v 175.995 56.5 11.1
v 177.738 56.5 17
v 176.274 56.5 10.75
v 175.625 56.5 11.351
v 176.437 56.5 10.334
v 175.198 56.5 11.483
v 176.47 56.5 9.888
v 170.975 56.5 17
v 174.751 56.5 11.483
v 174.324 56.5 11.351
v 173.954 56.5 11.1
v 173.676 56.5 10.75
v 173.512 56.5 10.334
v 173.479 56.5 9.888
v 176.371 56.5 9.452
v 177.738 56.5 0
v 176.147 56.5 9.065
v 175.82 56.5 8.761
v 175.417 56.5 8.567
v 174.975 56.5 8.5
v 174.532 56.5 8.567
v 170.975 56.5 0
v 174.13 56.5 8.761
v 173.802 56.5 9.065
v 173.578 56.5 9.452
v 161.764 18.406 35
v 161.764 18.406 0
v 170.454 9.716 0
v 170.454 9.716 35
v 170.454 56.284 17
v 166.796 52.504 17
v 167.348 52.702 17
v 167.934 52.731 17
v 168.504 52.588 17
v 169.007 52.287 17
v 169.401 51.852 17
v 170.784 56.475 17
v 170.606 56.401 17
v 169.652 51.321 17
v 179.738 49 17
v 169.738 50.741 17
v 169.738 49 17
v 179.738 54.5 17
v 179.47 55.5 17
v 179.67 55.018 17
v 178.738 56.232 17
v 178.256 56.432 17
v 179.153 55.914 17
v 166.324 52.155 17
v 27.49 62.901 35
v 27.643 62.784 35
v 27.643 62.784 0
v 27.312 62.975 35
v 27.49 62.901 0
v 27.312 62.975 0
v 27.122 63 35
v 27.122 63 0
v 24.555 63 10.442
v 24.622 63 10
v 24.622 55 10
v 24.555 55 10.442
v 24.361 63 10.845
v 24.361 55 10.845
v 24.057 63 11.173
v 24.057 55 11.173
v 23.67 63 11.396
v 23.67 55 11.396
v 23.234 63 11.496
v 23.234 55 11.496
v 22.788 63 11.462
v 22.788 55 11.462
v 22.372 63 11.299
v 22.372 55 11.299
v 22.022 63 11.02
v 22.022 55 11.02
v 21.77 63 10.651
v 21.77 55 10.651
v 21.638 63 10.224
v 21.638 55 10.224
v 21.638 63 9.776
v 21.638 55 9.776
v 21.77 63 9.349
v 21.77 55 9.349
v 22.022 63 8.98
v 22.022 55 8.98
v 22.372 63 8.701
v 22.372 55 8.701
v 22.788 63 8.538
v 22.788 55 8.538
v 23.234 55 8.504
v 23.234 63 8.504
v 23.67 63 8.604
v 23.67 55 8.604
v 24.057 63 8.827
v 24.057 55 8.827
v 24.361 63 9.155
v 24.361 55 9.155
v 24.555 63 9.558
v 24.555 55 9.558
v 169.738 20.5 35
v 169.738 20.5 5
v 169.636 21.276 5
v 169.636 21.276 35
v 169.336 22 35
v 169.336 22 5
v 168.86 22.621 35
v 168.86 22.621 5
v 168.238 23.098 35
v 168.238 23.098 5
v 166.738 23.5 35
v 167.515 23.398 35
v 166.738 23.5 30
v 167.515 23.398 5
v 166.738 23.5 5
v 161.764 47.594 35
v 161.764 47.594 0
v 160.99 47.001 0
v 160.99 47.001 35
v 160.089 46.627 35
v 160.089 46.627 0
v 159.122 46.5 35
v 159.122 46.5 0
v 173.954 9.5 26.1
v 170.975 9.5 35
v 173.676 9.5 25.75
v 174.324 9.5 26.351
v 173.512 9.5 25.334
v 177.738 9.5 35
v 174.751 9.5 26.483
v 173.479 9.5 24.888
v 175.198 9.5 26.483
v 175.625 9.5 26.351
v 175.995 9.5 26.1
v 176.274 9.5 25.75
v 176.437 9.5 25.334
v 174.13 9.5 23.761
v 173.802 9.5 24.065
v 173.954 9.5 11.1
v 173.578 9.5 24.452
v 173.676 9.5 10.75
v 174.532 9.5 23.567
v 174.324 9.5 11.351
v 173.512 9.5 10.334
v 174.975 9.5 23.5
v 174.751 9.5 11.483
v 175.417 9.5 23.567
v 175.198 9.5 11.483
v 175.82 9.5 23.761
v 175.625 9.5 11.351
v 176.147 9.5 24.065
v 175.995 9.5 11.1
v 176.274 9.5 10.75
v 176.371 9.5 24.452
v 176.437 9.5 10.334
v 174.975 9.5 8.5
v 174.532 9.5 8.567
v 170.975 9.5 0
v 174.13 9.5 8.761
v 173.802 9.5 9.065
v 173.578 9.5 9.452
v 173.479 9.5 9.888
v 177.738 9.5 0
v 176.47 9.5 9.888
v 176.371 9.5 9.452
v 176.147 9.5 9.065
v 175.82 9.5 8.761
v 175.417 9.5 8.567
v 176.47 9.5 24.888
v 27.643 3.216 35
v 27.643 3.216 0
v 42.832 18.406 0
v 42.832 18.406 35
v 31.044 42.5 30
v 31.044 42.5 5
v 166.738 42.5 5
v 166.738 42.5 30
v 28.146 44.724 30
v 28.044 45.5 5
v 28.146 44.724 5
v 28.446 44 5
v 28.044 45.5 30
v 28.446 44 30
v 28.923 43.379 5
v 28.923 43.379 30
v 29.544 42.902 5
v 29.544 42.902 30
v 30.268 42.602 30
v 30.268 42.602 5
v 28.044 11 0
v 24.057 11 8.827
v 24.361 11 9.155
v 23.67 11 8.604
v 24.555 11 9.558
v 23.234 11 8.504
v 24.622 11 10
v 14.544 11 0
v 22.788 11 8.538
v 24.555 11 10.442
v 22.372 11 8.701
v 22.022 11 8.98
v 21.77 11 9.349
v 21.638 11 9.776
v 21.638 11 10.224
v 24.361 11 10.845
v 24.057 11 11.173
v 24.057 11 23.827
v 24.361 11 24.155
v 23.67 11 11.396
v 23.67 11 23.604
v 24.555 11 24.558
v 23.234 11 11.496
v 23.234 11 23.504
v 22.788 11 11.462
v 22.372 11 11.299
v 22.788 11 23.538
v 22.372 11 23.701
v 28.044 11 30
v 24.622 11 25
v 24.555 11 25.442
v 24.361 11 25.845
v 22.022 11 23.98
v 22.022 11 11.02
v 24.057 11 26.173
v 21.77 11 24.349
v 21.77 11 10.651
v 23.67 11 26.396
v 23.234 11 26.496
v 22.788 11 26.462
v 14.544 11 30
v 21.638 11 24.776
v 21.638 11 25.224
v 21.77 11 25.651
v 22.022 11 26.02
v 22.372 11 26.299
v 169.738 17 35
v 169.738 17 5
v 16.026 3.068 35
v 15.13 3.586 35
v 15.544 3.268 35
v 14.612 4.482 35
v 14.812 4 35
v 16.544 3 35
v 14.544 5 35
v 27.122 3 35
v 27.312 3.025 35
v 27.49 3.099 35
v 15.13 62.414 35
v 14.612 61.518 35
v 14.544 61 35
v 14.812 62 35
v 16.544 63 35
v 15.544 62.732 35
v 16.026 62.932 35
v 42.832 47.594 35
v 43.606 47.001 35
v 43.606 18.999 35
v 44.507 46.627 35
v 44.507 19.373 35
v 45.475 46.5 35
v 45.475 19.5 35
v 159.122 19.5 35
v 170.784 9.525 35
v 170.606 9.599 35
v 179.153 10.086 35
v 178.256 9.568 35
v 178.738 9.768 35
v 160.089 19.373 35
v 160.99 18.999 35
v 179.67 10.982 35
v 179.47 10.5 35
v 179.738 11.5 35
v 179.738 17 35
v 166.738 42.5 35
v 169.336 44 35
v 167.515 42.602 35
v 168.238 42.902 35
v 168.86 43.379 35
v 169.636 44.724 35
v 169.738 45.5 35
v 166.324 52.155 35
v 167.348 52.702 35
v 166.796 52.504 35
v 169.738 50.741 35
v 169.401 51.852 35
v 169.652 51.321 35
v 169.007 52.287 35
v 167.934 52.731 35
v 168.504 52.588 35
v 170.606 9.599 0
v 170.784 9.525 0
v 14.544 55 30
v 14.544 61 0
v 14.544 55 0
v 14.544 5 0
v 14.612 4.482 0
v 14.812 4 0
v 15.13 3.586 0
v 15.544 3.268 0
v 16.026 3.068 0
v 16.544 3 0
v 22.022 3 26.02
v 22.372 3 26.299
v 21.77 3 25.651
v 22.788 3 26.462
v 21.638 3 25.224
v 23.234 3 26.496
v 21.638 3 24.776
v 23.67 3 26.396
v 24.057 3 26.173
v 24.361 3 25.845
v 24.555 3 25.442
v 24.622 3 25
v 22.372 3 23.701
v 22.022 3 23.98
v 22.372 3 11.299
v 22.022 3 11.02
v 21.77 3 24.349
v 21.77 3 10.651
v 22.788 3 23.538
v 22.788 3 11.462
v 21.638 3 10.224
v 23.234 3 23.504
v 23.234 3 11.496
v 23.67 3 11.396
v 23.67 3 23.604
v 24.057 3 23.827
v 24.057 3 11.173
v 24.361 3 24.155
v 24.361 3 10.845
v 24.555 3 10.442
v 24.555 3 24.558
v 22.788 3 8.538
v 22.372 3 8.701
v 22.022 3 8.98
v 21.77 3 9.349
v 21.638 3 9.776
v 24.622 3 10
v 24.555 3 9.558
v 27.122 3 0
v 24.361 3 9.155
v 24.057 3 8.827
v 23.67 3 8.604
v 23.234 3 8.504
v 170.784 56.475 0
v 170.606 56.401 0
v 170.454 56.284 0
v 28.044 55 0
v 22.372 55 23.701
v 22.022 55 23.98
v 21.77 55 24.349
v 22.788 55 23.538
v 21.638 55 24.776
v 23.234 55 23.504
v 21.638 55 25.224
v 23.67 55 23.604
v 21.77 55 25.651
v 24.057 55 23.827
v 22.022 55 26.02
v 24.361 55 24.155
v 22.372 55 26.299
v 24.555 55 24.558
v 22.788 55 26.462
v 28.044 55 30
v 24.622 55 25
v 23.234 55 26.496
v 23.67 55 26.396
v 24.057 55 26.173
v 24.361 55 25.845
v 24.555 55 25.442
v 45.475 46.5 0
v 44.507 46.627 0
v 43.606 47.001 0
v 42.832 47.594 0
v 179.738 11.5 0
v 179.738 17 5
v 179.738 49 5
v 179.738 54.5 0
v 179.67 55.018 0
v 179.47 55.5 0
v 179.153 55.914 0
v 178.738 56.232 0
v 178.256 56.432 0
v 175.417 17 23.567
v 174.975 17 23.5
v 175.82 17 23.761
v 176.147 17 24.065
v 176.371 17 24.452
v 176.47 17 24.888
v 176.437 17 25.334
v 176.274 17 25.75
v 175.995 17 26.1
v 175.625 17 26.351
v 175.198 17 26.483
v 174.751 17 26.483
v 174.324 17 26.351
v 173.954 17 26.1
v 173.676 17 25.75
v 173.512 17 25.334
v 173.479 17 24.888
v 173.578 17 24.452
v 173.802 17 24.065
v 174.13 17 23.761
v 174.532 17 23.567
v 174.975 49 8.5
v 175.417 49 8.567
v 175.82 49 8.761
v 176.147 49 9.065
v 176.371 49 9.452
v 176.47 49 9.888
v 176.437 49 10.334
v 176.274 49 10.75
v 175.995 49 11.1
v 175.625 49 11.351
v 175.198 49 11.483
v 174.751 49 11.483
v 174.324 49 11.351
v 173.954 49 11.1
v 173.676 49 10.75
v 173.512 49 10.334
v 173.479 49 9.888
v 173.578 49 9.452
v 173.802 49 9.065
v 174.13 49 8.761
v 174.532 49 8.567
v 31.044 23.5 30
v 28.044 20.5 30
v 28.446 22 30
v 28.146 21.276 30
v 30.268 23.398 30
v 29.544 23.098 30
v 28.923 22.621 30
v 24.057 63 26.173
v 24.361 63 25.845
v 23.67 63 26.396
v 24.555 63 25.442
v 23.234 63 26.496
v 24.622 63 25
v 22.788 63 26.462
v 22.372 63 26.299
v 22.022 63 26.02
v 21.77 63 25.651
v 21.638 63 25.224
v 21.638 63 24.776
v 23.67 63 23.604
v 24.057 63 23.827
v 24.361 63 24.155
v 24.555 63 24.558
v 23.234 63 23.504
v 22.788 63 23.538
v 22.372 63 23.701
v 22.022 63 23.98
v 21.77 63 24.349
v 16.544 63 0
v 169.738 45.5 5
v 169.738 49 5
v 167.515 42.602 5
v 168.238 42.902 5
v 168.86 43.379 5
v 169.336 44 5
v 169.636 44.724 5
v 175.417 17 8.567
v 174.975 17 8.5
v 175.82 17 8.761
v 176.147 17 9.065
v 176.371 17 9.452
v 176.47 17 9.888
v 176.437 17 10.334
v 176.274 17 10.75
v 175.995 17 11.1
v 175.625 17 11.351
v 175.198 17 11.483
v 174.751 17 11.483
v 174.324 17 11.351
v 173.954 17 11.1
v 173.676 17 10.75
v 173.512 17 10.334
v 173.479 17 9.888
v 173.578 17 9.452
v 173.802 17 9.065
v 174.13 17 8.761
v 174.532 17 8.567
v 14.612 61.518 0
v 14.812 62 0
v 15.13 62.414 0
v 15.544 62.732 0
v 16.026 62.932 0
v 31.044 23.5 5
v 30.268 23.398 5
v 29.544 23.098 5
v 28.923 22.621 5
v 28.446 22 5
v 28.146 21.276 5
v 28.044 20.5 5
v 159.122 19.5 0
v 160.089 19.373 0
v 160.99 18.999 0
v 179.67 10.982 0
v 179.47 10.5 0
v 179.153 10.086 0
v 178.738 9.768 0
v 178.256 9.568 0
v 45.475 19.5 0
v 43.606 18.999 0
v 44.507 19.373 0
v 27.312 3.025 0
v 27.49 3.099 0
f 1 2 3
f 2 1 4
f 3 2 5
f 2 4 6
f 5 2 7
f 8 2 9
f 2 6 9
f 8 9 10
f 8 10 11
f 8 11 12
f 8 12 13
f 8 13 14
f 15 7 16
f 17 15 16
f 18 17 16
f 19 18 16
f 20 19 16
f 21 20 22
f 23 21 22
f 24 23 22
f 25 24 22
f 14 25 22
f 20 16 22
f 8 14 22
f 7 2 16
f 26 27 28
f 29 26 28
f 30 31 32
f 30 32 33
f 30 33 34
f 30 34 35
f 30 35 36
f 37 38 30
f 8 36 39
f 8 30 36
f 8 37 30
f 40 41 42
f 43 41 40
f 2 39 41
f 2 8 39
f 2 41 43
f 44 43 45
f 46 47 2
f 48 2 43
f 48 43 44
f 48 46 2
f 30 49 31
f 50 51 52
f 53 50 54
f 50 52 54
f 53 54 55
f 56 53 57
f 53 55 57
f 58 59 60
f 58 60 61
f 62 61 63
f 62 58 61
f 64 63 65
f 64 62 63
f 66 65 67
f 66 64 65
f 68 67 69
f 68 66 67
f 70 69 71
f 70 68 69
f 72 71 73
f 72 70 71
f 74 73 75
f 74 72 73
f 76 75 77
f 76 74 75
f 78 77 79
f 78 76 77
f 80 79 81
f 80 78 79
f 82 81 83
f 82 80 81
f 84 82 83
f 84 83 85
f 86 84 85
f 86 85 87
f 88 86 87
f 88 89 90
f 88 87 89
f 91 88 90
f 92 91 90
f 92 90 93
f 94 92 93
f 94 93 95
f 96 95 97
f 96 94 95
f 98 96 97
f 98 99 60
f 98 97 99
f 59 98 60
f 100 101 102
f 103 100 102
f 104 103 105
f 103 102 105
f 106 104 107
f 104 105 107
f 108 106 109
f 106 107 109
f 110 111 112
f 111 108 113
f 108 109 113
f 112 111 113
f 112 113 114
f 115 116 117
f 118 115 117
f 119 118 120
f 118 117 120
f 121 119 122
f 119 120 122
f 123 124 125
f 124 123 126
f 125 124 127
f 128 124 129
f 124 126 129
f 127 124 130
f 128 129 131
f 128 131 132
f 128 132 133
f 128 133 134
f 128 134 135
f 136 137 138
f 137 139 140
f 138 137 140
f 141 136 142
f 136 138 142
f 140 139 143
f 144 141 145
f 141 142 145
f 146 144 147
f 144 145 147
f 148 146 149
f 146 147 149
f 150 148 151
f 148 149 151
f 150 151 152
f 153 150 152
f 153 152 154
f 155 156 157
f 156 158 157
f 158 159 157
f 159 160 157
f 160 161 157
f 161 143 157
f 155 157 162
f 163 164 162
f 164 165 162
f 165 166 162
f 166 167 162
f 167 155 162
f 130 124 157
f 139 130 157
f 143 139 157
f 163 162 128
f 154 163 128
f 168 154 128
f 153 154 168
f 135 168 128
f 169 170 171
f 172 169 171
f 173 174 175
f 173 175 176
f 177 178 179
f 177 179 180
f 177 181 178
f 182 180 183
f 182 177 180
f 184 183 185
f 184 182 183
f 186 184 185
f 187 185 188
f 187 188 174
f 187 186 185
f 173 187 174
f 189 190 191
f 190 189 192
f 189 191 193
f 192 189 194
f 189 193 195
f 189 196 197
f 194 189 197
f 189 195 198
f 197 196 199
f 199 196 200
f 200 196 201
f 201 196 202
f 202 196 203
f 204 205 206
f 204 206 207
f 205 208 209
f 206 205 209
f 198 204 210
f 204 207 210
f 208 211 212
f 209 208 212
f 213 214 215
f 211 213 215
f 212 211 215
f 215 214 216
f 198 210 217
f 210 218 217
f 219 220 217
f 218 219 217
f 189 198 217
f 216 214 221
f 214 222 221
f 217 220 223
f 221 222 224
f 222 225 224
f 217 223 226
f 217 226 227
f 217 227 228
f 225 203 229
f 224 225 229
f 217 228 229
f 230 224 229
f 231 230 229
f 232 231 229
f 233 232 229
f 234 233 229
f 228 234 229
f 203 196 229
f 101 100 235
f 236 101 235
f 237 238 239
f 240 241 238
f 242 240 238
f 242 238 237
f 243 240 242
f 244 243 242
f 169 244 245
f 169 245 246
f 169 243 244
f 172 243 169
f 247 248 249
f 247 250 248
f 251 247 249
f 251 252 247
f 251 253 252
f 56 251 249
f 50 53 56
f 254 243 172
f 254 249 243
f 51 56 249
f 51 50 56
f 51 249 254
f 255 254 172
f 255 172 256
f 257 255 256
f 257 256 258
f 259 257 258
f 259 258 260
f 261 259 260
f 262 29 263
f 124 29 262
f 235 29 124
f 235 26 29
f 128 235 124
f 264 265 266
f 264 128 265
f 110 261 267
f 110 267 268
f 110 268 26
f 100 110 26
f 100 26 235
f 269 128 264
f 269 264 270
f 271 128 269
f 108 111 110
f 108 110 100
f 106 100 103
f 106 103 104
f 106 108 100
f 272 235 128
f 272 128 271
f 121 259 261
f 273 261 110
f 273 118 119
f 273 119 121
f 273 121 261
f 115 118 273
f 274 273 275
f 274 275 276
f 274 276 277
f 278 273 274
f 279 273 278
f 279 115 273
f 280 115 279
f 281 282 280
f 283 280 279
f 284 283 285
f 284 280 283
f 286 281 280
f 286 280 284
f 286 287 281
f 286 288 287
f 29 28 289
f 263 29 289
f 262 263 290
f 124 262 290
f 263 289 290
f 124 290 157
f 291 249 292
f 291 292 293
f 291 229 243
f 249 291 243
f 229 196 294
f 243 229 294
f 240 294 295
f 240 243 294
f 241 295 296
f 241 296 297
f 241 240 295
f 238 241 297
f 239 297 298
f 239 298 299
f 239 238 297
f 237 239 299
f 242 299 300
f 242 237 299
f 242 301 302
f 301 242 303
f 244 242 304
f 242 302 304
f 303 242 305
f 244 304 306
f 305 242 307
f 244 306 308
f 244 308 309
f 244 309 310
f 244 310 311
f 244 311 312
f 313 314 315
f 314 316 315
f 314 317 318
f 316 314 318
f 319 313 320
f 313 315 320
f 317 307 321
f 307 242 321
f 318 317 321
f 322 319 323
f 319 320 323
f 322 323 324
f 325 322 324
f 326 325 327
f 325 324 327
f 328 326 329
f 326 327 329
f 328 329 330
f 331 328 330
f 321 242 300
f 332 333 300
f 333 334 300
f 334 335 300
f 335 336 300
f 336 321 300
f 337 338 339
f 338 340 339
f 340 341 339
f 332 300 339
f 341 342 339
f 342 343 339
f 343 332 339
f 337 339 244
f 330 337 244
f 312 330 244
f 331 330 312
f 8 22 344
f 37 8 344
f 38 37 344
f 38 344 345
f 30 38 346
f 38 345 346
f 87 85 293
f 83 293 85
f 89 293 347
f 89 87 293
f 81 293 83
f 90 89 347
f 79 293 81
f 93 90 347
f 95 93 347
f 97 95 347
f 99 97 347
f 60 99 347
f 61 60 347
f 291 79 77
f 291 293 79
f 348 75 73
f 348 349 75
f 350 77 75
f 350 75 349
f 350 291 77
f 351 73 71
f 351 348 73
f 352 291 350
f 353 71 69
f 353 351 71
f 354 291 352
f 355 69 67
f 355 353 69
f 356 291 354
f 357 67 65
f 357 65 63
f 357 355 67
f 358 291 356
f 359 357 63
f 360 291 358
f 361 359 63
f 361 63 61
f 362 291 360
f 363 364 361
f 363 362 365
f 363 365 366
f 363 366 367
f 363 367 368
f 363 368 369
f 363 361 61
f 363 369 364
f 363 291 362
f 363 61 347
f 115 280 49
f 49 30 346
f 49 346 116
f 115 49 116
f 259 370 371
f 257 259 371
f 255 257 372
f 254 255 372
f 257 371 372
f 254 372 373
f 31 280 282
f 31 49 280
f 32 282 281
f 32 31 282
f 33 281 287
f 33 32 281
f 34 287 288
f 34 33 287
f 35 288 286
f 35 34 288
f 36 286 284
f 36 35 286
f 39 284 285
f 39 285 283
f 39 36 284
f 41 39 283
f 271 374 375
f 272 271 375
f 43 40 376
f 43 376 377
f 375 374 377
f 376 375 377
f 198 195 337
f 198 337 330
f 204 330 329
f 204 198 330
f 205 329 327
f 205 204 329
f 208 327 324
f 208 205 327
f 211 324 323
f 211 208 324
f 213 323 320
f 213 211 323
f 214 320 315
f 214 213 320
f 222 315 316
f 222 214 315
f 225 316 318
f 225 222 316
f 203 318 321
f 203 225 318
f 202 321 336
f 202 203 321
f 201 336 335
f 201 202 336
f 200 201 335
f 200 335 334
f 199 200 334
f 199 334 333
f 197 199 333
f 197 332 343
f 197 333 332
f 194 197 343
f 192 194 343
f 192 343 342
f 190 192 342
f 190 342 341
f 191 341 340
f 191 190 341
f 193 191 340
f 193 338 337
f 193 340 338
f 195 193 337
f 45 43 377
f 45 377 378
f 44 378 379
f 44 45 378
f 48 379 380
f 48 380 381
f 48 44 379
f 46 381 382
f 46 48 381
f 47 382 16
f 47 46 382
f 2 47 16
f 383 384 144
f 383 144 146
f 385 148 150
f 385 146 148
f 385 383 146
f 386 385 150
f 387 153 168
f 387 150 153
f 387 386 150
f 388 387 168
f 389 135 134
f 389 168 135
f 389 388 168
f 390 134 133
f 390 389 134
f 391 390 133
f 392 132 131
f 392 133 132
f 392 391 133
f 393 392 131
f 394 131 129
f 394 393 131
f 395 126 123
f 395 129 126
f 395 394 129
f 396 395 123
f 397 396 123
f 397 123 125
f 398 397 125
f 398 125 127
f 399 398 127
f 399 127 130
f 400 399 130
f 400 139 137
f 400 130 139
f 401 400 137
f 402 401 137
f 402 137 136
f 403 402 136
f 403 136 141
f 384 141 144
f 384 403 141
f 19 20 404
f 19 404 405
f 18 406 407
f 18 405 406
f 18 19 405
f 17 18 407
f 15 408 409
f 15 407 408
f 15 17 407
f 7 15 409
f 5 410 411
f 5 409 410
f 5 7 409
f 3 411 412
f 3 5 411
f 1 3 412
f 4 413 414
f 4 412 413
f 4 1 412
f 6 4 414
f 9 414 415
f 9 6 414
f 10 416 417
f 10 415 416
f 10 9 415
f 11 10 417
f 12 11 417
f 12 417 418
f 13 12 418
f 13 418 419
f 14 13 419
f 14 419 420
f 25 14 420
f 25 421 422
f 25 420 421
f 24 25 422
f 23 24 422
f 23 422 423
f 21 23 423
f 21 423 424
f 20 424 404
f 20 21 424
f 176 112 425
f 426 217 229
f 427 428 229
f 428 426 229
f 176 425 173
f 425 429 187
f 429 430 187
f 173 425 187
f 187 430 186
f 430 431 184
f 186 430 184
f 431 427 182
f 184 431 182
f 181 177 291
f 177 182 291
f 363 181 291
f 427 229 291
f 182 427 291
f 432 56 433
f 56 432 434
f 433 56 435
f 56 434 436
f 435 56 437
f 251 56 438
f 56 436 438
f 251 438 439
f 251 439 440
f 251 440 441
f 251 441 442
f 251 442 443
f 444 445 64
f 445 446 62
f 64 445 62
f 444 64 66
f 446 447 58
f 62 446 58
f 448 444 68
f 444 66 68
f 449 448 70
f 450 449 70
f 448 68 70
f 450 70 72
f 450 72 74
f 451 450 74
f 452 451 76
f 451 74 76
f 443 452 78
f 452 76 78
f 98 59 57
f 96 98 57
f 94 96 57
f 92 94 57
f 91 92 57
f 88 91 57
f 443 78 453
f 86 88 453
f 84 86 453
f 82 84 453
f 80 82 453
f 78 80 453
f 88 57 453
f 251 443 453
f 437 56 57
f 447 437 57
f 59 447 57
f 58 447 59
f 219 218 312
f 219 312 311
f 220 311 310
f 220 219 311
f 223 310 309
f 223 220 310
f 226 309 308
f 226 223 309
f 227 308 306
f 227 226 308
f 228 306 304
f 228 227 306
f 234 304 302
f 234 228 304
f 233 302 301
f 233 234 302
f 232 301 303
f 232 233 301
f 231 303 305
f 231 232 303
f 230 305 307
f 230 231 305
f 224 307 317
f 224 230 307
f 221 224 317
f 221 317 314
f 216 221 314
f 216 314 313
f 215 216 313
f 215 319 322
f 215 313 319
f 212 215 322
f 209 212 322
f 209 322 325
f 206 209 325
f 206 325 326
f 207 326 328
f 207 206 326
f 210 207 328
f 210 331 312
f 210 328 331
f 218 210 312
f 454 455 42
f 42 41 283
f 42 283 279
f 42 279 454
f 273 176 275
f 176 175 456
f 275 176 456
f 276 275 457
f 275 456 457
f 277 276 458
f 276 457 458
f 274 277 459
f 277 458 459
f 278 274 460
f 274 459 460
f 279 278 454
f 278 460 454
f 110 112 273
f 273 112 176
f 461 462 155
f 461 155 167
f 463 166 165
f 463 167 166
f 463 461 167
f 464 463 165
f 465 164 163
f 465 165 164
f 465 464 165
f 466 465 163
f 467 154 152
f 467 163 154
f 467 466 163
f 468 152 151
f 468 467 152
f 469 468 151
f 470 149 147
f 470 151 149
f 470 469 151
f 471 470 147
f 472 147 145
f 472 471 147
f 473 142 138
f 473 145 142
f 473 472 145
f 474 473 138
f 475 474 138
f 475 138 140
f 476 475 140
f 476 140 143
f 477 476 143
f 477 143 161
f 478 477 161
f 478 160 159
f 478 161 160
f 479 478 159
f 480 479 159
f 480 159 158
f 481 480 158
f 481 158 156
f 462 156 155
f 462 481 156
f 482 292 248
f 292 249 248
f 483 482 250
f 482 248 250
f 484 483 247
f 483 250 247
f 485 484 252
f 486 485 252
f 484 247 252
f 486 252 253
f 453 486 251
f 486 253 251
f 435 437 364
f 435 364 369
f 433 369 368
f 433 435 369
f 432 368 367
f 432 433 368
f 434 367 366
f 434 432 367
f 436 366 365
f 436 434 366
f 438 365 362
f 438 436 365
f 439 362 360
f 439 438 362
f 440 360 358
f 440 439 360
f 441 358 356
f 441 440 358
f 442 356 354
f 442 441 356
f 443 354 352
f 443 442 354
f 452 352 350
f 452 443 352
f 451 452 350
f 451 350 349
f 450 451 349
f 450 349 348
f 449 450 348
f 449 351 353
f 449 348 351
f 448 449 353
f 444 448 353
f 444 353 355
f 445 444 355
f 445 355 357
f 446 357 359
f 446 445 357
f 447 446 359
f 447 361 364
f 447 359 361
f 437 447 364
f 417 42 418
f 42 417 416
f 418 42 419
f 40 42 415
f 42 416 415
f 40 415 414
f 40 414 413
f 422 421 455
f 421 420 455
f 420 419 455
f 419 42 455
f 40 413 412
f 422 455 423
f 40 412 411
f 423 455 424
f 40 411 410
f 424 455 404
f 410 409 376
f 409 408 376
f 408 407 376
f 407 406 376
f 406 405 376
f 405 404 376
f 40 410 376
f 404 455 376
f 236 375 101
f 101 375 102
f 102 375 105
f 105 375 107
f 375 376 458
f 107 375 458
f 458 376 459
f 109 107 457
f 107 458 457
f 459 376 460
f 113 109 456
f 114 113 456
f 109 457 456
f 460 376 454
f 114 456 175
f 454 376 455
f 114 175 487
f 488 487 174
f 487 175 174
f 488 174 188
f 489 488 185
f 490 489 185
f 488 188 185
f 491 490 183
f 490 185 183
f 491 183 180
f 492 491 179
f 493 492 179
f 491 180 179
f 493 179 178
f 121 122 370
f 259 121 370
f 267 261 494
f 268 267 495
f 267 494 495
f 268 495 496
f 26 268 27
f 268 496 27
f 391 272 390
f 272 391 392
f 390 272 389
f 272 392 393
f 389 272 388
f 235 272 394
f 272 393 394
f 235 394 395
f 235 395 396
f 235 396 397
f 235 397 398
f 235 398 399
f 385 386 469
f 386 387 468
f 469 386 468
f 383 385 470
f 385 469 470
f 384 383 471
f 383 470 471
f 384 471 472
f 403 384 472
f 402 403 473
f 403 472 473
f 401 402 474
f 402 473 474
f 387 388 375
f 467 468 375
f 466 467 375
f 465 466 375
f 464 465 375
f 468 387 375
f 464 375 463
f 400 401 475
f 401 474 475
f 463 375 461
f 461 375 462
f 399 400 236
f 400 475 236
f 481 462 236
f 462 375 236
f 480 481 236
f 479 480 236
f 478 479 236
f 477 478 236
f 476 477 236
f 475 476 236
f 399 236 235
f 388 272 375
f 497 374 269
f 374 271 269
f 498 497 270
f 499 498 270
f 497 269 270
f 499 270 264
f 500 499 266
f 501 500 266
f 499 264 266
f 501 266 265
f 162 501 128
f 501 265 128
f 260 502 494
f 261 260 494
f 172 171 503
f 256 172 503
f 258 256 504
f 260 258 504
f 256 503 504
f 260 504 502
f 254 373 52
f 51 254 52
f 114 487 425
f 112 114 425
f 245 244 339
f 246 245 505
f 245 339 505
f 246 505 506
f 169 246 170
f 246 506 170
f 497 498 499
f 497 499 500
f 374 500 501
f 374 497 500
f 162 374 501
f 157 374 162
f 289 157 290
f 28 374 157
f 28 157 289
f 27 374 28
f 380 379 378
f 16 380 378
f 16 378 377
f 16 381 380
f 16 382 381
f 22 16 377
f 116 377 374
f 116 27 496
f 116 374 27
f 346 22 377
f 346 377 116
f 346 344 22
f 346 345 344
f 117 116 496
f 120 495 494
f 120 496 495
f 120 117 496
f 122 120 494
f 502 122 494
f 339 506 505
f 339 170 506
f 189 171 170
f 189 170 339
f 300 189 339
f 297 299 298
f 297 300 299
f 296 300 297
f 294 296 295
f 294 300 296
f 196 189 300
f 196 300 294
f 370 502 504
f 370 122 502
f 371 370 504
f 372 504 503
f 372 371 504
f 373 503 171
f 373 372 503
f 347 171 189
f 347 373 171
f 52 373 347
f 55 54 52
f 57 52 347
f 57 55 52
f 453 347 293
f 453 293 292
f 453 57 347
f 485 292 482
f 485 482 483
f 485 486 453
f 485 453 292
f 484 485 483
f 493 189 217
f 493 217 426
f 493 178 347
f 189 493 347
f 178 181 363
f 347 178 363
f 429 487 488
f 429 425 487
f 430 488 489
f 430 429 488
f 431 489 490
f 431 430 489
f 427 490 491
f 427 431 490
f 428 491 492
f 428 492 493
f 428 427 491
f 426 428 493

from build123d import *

# Parameters (mm, degrees)
EXTRUDE_1_DEPTH          = 35
SKETCH_3_W               = 25
SKETCH_3_H               = 19
CUT_EXTRUDE_1_DEPTH      = 181.230887126
SKETCH_4_W               = 25
SKETCH_4_H               = 12.5
CUT_EXTRUDE_2_DEPTH      = 13.5
SKETCH_5_W               = 25
SKETCH_5_H               = 32
CUT_EXTRUDE_3_DEPTH      = 10
FILLET_1_R               = 3
FILLET_2_R               = 2
CUT_EXTRUDE_4_DEPTH      = 191.354670013
CUT_EXTRUDE_4_DEPTH_BACK = 191.354670013
SKETCH_6_R               = 1.5
CUT_EXTRUDE_5_DEPTH      = 189.803867534
CUT_EXTRUDE_5_DEPTH_BACK = 189.803867534
SKETCH_7_R               = 1.5
SKETCH_8_W               = 13.5
SKETCH_8_H               = 44
SKETCH_8_W_2             = 10
SKETCH_8_H_2             = 32
CUT_EXTRUDE_6_DEPTH      = 193.807936548
CUT_EXTRUDE_7_DEPTH      = 10
CUT_EXTRUDE_8_DEPTH      = 18
FILLET_3_R               = 2
SKETCH_11_W              = 10
SKETCH_11_H              = 32
EXTRUDE_2_DEPTH          = 5
CUT_EXTRUDE_10_DEPTH     = 5


with BuildPart() as part:
    # 草图1 → 凸台-拉伸1 (new body)
    with BuildSketch(Plane.XY):
        with BuildLine():
            Line((42.832374142, 47.594424801), (27.642544089, 62.784254855))
            ThreePointArc((27.642544089, 62.784254855), (27.40357385, 62.943929664), (27.121689234, 63))
            Line((27.121689234, 63), (14.544073956, 63))
            Line((14.544073956, 63), (14.544073956, 3))
            Line((14.544073956, 3), (27.121689234, 3))
            ThreePointArc((27.121689234, 3), (27.40357385, 3.056070336), (27.642544089, 3.215745145))
            Line((27.642544089, 3.215745145), (42.832374142, 18.405575199))
            ThreePointArc((42.832374142, 18.405575199), (44.044614428, 19.215568261), (45.474549341, 19.5))
            Line((45.474549341, 19.5), (159.121689234, 19.5))
            ThreePointArc((159.121689234, 19.5), (160.551624147, 19.215568261), (161.763864432, 18.405575199))
            Line((161.763864432, 18.405575199), (170.453694486, 9.715745145))
            ThreePointArc((170.453694486, 9.715745145), (170.692664725, 9.556070336), (170.974549341, 9.5))
            Line((170.974549341, 9.5), (179.738422147, 9.5))
            Line((179.738422147, 9.5), (179.738422147, 56.5))
            Line((179.738422147, 56.5), (170.974549341, 56.5))
            ThreePointArc((170.974549341, 56.5), (170.692664725, 56.443929664), (170.453694486, 56.284254855))
            Line((170.453694486, 56.284254855), (161.763864432, 47.594424801))
            ThreePointArc((161.763864432, 47.594424801), (160.551624147, 46.784431739), (159.121689234, 46.5))
            Line((159.121689234, 46.5), (45.474549341, 46.5))
            ThreePointArc((45.474549341, 46.5), (44.044614428, 46.784431739), (42.832374142, 47.594424801))
        make_face()
    extrude(amount=EXTRUDE_1_DEPTH)

    # 草图3 → 切除-拉伸1 (cut, through all)
    with BuildSketch(Plane.ZY.offset(-14.544073956)):
        with Locations((17.5, 33)):
            Rectangle(SKETCH_3_W, SKETCH_3_H)
    extrude(amount=-CUT_EXTRUDE_1_DEPTH, mode=Mode.SUBTRACT)

    # 草图4 → 切除-拉伸2 (cut)
    with BuildSketch(Plane.ZY.offset(-14.544073956)):
        with Locations((17.5, 48.75)):
            Rectangle(SKETCH_4_W, SKETCH_4_H)
        with Locations((17.5, 17.25)):
            Rectangle(SKETCH_4_W, SKETCH_4_H)
    extrude(amount=-CUT_EXTRUDE_2_DEPTH, mode=Mode.SUBTRACT)

    # 草图5 → 切除-拉伸3 (cut)
    with BuildSketch(Plane(origin=(179.738422147, 0, 0), x_dir=(0, 0, -1), z_dir=(1, 0, 0))):
        with Locations((-17.5, 33)):
            Rectangle(SKETCH_5_W, SKETCH_5_H)
    extrude(amount=-CUT_EXTRUDE_3_DEPTH, mode=Mode.SUBTRACT)

    # 圆角1
    fillet_1_edges = [part.edges().sort_by_distance(p)[0] for p in [
        (169.738422147, 23.5, 17.5),
        (169.738422147, 42.5, 17.5),
        (28.044073956, 42.5, 17.5),
        (28.044073956, 23.5, 17.5),
    ]]
    fillet(fillet_1_edges, radius=FILLET_1_R)

    # 圆角2
    fillet_2_edges = [part.edges().sort_by_distance(p)[0] for p in [
        (179.738422147, 56.5, 17.5),
        (179.738422147, 9.5, 17.5),
        (14.544073956, 3, 17.5),
        (14.544073956, 63, 17.5),
    ]]
    fillet(fillet_2_edges, radius=FILLET_2_R)

    # 草图6 → 切除-拉伸4 (cut, two sides: drawn at the far end of the back side and taken through both)
    with BuildSketch(Plane.XZ.offset(-55).offset(-CUT_EXTRUDE_4_DEPTH_BACK)):
        with Locations((23.121689234, 25)):
            Circle(SKETCH_6_R)
        with Locations((23.121689234, 10)):
            Circle(SKETCH_6_R)
    extrude(amount=CUT_EXTRUDE_4_DEPTH + CUT_EXTRUDE_4_DEPTH_BACK, mode=Mode.SUBTRACT)

    # 草图7 → 切除-拉伸5 (cut, two sides: drawn at the far end of the back side and taken through both)
    with BuildSketch(Plane.XZ.offset(-49).offset(-CUT_EXTRUDE_5_DEPTH_BACK)):
        with Locations(Location((174.974549341, 25, 0), (0, 0, 270))):
            Circle(SKETCH_7_R)
        with Locations(Location((174.974549341, 10, 0), (0, 0, 270))):
            Circle(SKETCH_7_R)
    extrude(amount=CUT_EXTRUDE_5_DEPTH + CUT_EXTRUDE_5_DEPTH_BACK, mode=Mode.SUBTRACT)

    # 草图8 → 切除-拉伸6 (cut, through all)
    with BuildSketch(Plane.XY.offset(5)):
        with Locations((21.294073956, 33)):
            Rectangle(SKETCH_8_W, SKETCH_8_H)
        with Locations((174.738422147, 33)):
            Rectangle(SKETCH_8_W_2, SKETCH_8_H_2)
    extrude(amount=-CUT_EXTRUDE_6_DEPTH, mode=Mode.SUBTRACT)

    # 草图9 → 切除-拉伸7 (cut)
    with BuildSketch(Plane(origin=(0, 0, 30), x_dir=(-1, 0, 0), z_dir=(0, 0, -1))):
        Polygon((-169.738422147, 49), (-179.738422147, 49), (-179.738422147, 17), (-169.738422147, 17), (-169.738422147, 20.5), (-169.738422147, 45.5), align=None)
    extrude(amount=-CUT_EXTRUDE_7_DEPTH, mode=Mode.SUBTRACT)

    # 草图10 → 切除-拉伸8 (cut)
    with BuildSketch(Plane.XY.offset(35)):
        with BuildLine():
            Line((169.738422147, 55.568982516), (169.738422147, 49))
            Line((169.738422147, 49), (179.738422147, 49))
            Line((179.738422147, 49), (179.738422147, 54.5))
            ThreePointArc((179.738422147, 54.5), (179.15263571, 55.914213562), (177.738422147, 56.5))
            Line((177.738422147, 56.5), (170.974549341, 56.5))
            ThreePointArc((170.974549341, 56.5), (170.692664725, 56.443929664), (170.453694486, 56.284254855))
            Line((170.453694486, 56.284254855), (169.738422147, 55.568982516))
        make_face()
    extrude(amount=-CUT_EXTRUDE_8_DEPTH, mode=Mode.SUBTRACT)

    # 圆角3
    fillet_3_edges = [part.edges().sort_by_distance(p)[0] for p in [
        (169.738422147, 55.568982516, 26),
    ]]
    fillet(fillet_3_edges, radius=FILLET_3_R)

    # 草图11 → 凸台-拉伸2 (add)
    with BuildSketch(Plane(origin=(0, 0, 0), x_dir=(-1, 0, 0), z_dir=(0, 0, -1))):
        with Locations((-174.738422147, 33)):
            Rectangle(SKETCH_11_W, SKETCH_11_H)
    extrude(amount=-EXTRUDE_2_DEPTH)

    # 草图12 → 切除-拉伸10 (cut)
    with BuildSketch(Plane(origin=(0, 0, 30), x_dir=(-1, 0, 0), z_dir=(0, 0, -1))):
        with BuildLine():
            Line((-166.738422147, 23.5), (-166.738422147, 42.5))
            ThreePointArc((-166.738422147, 42.5), (-168.859742491, 43.378679656), (-169.738422147, 45.5))
            Line((-169.738422147, 45.5), (-169.738422147, 20.5))
            ThreePointArc((-169.738422147, 20.5), (-168.859742491, 22.621320344), (-166.738422147, 23.5))
        make_face()
    extrude(amount=-CUT_EXTRUDE_10_DEPTH, mode=Mode.SUBTRACT)


solid = part.part
